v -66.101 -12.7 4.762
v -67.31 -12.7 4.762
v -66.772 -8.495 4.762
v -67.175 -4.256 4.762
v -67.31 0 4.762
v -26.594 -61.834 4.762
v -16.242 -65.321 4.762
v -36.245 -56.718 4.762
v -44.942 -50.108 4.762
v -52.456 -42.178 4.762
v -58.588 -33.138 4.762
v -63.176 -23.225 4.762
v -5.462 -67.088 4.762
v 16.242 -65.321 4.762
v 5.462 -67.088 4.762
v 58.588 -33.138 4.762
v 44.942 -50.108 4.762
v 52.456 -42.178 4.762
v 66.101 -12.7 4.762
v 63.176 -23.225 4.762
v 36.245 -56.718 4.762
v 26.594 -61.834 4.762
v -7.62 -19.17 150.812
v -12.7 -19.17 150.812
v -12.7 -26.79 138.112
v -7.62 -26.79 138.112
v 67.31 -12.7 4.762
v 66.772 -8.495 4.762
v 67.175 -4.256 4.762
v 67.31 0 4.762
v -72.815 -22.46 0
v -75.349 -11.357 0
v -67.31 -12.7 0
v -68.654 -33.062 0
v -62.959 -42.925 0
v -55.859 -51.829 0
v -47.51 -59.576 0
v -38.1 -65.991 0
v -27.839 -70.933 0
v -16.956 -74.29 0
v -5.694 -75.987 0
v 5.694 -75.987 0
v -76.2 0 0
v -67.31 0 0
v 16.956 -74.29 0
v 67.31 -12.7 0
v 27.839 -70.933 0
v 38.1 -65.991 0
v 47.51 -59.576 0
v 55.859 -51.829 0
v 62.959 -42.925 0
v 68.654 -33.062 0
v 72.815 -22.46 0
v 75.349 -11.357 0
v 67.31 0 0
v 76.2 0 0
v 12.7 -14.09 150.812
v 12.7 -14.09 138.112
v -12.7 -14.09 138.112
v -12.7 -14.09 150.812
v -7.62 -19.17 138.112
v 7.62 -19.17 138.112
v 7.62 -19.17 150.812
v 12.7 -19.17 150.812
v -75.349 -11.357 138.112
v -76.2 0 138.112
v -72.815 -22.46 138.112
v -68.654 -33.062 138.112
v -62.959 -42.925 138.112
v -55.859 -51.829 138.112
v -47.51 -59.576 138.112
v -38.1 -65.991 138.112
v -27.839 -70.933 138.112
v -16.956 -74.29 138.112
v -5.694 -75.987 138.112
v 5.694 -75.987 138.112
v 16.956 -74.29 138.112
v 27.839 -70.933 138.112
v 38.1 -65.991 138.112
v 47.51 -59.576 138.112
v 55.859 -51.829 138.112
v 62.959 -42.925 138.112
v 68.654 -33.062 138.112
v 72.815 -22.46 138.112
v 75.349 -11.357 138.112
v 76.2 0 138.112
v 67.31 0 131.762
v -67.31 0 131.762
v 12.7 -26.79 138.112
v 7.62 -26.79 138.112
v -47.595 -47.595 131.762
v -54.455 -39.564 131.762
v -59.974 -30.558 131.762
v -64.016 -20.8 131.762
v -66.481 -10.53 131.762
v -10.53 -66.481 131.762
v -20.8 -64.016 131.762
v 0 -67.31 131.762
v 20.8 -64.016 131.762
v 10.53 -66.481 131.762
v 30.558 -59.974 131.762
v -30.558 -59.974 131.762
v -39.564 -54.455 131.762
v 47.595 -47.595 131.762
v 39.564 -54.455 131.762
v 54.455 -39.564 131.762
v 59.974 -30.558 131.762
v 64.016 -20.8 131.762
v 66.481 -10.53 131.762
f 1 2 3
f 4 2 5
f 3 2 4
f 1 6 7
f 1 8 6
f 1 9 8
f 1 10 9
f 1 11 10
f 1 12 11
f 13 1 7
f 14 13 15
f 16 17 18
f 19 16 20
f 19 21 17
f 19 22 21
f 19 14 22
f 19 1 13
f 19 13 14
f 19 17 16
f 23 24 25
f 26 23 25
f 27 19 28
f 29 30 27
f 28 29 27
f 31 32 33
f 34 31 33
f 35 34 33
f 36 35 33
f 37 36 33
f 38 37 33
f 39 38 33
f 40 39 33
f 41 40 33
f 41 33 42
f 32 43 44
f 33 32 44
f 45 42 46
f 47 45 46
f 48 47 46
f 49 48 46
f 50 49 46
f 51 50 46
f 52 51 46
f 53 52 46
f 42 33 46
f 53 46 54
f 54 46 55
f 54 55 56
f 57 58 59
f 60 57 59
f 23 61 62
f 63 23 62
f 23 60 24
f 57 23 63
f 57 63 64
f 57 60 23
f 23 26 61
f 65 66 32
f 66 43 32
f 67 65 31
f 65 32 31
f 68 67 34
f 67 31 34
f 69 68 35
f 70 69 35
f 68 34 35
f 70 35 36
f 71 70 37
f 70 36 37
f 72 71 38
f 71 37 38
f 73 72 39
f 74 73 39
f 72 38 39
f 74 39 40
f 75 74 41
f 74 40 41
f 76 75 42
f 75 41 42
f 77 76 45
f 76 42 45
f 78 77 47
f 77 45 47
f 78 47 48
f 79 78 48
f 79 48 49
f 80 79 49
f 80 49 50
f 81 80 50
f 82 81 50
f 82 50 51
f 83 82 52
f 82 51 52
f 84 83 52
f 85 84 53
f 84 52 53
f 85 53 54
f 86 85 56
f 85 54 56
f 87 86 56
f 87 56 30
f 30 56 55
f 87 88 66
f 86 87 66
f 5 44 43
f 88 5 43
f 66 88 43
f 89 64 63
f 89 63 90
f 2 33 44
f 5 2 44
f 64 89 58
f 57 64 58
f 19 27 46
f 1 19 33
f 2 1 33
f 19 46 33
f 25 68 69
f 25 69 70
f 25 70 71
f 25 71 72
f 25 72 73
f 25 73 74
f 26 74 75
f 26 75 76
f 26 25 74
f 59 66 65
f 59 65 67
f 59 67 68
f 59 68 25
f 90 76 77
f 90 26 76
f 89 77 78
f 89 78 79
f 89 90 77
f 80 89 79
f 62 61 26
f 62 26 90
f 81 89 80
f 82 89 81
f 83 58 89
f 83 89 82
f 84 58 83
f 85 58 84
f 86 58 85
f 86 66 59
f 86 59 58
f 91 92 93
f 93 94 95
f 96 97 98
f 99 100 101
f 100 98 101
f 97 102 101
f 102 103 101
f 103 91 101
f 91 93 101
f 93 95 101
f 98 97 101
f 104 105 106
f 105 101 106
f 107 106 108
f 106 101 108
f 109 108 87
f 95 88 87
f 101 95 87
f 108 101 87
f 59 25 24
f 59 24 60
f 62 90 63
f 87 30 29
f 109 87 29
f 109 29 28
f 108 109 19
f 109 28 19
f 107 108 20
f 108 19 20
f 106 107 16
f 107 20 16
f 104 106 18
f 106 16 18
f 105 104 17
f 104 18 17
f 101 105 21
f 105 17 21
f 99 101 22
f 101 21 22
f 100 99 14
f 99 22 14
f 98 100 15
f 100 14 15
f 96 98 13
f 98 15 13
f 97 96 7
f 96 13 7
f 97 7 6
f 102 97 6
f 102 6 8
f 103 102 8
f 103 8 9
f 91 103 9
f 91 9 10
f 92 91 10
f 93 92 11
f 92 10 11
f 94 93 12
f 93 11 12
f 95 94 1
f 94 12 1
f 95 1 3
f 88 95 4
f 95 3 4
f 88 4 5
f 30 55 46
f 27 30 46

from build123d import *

# Parameters (mm, degrees)
F1_DEPTH       = 4.7625
F3_DEPTH       = 127
F5_DEPTH       = 6.35
F7_DEPTH       = 12.7
F9_DEPTH       = 5.08
F11_ANGLE_BACK = 20
F11_ANGLE      = 40
F12_R          = 5.08


# Not quite as in the source:
# - a length typed as a fraction of an inch, garbled in the dataset ("3 / 203.2 mm" for 3/8 in), is restored
# - a pattern or mirror of a feature is missing from the dataset's text; its kind, count and spacing are read off the source's solid


with BuildPart() as f1:
    # F0 (on Top) → F1 (new body)
    with BuildSketch(Plane.XY):
        with BuildLine():
            ThreePointArc((-76.2, 0), (0, -76.2), (76.2, 0))
            Line((76.2, 0), (67.31, 0))
            Line((67.31, 0), (67.31, -12.7))
            Line((67.31, -12.7), (-67.31, -12.7))
            Line((-67.31, -12.7), (-67.31, 0))
            Line((-67.31, 0), (-76.2, 0))
        make_face()
    extrude(amount=F1_DEPTH)

    # F2 (on face) → F3 (join)
    with BuildSketch(Plane.XY.offset(4.7625)):
        with BuildLine():
            Line((-67.31, 0), (-76.2, 0))
            ThreePointArc((-76.2, 0), (0, -76.2), (76.2, 0))
            Line((76.2, 0), (67.31, 0))
            ThreePointArc((67.31, 0), (0, -67.31), (-67.31, 0))
        make_face()
    extrude(amount=F3_DEPTH)

    # F4 (on face) → F5 (join)
    with BuildSketch(Plane.XY.offset(131.7625)):
        with BuildLine():
            Line((76.2, 0), (-76.2, 0))
            ThreePointArc((-76.2, 0), (0, -76.2), (76.2, 0))
        make_face()
    extrude(amount=F5_DEPTH)

    # F6 (on face) → F7 (join)
    with BuildSketch(Plane.XY.offset(138.1125)):
        Polygon((12.7, -14.0898204726), (0, -14.0898204726), (-12.7, -14.0898204726), (-12.7, -19.1698204726), (0, -19.1698204726), (12.7, -19.1698204726), align=None)
    extrude(amount=F7_DEPTH)

    # F8 (on face) → F9 (join)
    with BuildSketch(Plane.YZ.offset(12.7)):
        Polygon((-19.1698204726, 150.8125), (-26.7898204726, 138.1125), (-19.1698204726, 138.1125), align=None)
    f9 = extrude(amount=-F9_DEPTH)

    # F9_copies: F9 across plane
    add(f9.mirror(Plane(origin=(0, 0, 0), x_dir=(0, 0, -1), z_dir=(-1, 0, 0))))


with BuildPart() as f11:
    # F10 (on Right) → F11 (revolve)
    with BuildSketch(Plane.YZ, mode=Mode.PRIVATE) as f11_sk:
        Polygon((-98.6883191255, -24.4902079291), (-69.5020258427, 0), (-76.2, 0), (-76.2, 5.1620067097), (-104.2903103798, -17.814014726), align=None)
    revolve(f11_sk.sketch.rotate(Axis((0, 0, 0), (0, 0, -1)), -F11_ANGLE_BACK), axis=Axis((0, 0, 0), (0, 0, -1)), revolution_arc=F11_ANGLE)

    # F12
    f12_edges = [f11.edges().sort_by_distance(p)[0] for p in [
        (34.71139, -95.36876, -21.152111),
        (-34.71139, -95.36876, -21.152111),
    ]]
    fillet(f12_edges, radius=F12_R)


solid = f1.part
